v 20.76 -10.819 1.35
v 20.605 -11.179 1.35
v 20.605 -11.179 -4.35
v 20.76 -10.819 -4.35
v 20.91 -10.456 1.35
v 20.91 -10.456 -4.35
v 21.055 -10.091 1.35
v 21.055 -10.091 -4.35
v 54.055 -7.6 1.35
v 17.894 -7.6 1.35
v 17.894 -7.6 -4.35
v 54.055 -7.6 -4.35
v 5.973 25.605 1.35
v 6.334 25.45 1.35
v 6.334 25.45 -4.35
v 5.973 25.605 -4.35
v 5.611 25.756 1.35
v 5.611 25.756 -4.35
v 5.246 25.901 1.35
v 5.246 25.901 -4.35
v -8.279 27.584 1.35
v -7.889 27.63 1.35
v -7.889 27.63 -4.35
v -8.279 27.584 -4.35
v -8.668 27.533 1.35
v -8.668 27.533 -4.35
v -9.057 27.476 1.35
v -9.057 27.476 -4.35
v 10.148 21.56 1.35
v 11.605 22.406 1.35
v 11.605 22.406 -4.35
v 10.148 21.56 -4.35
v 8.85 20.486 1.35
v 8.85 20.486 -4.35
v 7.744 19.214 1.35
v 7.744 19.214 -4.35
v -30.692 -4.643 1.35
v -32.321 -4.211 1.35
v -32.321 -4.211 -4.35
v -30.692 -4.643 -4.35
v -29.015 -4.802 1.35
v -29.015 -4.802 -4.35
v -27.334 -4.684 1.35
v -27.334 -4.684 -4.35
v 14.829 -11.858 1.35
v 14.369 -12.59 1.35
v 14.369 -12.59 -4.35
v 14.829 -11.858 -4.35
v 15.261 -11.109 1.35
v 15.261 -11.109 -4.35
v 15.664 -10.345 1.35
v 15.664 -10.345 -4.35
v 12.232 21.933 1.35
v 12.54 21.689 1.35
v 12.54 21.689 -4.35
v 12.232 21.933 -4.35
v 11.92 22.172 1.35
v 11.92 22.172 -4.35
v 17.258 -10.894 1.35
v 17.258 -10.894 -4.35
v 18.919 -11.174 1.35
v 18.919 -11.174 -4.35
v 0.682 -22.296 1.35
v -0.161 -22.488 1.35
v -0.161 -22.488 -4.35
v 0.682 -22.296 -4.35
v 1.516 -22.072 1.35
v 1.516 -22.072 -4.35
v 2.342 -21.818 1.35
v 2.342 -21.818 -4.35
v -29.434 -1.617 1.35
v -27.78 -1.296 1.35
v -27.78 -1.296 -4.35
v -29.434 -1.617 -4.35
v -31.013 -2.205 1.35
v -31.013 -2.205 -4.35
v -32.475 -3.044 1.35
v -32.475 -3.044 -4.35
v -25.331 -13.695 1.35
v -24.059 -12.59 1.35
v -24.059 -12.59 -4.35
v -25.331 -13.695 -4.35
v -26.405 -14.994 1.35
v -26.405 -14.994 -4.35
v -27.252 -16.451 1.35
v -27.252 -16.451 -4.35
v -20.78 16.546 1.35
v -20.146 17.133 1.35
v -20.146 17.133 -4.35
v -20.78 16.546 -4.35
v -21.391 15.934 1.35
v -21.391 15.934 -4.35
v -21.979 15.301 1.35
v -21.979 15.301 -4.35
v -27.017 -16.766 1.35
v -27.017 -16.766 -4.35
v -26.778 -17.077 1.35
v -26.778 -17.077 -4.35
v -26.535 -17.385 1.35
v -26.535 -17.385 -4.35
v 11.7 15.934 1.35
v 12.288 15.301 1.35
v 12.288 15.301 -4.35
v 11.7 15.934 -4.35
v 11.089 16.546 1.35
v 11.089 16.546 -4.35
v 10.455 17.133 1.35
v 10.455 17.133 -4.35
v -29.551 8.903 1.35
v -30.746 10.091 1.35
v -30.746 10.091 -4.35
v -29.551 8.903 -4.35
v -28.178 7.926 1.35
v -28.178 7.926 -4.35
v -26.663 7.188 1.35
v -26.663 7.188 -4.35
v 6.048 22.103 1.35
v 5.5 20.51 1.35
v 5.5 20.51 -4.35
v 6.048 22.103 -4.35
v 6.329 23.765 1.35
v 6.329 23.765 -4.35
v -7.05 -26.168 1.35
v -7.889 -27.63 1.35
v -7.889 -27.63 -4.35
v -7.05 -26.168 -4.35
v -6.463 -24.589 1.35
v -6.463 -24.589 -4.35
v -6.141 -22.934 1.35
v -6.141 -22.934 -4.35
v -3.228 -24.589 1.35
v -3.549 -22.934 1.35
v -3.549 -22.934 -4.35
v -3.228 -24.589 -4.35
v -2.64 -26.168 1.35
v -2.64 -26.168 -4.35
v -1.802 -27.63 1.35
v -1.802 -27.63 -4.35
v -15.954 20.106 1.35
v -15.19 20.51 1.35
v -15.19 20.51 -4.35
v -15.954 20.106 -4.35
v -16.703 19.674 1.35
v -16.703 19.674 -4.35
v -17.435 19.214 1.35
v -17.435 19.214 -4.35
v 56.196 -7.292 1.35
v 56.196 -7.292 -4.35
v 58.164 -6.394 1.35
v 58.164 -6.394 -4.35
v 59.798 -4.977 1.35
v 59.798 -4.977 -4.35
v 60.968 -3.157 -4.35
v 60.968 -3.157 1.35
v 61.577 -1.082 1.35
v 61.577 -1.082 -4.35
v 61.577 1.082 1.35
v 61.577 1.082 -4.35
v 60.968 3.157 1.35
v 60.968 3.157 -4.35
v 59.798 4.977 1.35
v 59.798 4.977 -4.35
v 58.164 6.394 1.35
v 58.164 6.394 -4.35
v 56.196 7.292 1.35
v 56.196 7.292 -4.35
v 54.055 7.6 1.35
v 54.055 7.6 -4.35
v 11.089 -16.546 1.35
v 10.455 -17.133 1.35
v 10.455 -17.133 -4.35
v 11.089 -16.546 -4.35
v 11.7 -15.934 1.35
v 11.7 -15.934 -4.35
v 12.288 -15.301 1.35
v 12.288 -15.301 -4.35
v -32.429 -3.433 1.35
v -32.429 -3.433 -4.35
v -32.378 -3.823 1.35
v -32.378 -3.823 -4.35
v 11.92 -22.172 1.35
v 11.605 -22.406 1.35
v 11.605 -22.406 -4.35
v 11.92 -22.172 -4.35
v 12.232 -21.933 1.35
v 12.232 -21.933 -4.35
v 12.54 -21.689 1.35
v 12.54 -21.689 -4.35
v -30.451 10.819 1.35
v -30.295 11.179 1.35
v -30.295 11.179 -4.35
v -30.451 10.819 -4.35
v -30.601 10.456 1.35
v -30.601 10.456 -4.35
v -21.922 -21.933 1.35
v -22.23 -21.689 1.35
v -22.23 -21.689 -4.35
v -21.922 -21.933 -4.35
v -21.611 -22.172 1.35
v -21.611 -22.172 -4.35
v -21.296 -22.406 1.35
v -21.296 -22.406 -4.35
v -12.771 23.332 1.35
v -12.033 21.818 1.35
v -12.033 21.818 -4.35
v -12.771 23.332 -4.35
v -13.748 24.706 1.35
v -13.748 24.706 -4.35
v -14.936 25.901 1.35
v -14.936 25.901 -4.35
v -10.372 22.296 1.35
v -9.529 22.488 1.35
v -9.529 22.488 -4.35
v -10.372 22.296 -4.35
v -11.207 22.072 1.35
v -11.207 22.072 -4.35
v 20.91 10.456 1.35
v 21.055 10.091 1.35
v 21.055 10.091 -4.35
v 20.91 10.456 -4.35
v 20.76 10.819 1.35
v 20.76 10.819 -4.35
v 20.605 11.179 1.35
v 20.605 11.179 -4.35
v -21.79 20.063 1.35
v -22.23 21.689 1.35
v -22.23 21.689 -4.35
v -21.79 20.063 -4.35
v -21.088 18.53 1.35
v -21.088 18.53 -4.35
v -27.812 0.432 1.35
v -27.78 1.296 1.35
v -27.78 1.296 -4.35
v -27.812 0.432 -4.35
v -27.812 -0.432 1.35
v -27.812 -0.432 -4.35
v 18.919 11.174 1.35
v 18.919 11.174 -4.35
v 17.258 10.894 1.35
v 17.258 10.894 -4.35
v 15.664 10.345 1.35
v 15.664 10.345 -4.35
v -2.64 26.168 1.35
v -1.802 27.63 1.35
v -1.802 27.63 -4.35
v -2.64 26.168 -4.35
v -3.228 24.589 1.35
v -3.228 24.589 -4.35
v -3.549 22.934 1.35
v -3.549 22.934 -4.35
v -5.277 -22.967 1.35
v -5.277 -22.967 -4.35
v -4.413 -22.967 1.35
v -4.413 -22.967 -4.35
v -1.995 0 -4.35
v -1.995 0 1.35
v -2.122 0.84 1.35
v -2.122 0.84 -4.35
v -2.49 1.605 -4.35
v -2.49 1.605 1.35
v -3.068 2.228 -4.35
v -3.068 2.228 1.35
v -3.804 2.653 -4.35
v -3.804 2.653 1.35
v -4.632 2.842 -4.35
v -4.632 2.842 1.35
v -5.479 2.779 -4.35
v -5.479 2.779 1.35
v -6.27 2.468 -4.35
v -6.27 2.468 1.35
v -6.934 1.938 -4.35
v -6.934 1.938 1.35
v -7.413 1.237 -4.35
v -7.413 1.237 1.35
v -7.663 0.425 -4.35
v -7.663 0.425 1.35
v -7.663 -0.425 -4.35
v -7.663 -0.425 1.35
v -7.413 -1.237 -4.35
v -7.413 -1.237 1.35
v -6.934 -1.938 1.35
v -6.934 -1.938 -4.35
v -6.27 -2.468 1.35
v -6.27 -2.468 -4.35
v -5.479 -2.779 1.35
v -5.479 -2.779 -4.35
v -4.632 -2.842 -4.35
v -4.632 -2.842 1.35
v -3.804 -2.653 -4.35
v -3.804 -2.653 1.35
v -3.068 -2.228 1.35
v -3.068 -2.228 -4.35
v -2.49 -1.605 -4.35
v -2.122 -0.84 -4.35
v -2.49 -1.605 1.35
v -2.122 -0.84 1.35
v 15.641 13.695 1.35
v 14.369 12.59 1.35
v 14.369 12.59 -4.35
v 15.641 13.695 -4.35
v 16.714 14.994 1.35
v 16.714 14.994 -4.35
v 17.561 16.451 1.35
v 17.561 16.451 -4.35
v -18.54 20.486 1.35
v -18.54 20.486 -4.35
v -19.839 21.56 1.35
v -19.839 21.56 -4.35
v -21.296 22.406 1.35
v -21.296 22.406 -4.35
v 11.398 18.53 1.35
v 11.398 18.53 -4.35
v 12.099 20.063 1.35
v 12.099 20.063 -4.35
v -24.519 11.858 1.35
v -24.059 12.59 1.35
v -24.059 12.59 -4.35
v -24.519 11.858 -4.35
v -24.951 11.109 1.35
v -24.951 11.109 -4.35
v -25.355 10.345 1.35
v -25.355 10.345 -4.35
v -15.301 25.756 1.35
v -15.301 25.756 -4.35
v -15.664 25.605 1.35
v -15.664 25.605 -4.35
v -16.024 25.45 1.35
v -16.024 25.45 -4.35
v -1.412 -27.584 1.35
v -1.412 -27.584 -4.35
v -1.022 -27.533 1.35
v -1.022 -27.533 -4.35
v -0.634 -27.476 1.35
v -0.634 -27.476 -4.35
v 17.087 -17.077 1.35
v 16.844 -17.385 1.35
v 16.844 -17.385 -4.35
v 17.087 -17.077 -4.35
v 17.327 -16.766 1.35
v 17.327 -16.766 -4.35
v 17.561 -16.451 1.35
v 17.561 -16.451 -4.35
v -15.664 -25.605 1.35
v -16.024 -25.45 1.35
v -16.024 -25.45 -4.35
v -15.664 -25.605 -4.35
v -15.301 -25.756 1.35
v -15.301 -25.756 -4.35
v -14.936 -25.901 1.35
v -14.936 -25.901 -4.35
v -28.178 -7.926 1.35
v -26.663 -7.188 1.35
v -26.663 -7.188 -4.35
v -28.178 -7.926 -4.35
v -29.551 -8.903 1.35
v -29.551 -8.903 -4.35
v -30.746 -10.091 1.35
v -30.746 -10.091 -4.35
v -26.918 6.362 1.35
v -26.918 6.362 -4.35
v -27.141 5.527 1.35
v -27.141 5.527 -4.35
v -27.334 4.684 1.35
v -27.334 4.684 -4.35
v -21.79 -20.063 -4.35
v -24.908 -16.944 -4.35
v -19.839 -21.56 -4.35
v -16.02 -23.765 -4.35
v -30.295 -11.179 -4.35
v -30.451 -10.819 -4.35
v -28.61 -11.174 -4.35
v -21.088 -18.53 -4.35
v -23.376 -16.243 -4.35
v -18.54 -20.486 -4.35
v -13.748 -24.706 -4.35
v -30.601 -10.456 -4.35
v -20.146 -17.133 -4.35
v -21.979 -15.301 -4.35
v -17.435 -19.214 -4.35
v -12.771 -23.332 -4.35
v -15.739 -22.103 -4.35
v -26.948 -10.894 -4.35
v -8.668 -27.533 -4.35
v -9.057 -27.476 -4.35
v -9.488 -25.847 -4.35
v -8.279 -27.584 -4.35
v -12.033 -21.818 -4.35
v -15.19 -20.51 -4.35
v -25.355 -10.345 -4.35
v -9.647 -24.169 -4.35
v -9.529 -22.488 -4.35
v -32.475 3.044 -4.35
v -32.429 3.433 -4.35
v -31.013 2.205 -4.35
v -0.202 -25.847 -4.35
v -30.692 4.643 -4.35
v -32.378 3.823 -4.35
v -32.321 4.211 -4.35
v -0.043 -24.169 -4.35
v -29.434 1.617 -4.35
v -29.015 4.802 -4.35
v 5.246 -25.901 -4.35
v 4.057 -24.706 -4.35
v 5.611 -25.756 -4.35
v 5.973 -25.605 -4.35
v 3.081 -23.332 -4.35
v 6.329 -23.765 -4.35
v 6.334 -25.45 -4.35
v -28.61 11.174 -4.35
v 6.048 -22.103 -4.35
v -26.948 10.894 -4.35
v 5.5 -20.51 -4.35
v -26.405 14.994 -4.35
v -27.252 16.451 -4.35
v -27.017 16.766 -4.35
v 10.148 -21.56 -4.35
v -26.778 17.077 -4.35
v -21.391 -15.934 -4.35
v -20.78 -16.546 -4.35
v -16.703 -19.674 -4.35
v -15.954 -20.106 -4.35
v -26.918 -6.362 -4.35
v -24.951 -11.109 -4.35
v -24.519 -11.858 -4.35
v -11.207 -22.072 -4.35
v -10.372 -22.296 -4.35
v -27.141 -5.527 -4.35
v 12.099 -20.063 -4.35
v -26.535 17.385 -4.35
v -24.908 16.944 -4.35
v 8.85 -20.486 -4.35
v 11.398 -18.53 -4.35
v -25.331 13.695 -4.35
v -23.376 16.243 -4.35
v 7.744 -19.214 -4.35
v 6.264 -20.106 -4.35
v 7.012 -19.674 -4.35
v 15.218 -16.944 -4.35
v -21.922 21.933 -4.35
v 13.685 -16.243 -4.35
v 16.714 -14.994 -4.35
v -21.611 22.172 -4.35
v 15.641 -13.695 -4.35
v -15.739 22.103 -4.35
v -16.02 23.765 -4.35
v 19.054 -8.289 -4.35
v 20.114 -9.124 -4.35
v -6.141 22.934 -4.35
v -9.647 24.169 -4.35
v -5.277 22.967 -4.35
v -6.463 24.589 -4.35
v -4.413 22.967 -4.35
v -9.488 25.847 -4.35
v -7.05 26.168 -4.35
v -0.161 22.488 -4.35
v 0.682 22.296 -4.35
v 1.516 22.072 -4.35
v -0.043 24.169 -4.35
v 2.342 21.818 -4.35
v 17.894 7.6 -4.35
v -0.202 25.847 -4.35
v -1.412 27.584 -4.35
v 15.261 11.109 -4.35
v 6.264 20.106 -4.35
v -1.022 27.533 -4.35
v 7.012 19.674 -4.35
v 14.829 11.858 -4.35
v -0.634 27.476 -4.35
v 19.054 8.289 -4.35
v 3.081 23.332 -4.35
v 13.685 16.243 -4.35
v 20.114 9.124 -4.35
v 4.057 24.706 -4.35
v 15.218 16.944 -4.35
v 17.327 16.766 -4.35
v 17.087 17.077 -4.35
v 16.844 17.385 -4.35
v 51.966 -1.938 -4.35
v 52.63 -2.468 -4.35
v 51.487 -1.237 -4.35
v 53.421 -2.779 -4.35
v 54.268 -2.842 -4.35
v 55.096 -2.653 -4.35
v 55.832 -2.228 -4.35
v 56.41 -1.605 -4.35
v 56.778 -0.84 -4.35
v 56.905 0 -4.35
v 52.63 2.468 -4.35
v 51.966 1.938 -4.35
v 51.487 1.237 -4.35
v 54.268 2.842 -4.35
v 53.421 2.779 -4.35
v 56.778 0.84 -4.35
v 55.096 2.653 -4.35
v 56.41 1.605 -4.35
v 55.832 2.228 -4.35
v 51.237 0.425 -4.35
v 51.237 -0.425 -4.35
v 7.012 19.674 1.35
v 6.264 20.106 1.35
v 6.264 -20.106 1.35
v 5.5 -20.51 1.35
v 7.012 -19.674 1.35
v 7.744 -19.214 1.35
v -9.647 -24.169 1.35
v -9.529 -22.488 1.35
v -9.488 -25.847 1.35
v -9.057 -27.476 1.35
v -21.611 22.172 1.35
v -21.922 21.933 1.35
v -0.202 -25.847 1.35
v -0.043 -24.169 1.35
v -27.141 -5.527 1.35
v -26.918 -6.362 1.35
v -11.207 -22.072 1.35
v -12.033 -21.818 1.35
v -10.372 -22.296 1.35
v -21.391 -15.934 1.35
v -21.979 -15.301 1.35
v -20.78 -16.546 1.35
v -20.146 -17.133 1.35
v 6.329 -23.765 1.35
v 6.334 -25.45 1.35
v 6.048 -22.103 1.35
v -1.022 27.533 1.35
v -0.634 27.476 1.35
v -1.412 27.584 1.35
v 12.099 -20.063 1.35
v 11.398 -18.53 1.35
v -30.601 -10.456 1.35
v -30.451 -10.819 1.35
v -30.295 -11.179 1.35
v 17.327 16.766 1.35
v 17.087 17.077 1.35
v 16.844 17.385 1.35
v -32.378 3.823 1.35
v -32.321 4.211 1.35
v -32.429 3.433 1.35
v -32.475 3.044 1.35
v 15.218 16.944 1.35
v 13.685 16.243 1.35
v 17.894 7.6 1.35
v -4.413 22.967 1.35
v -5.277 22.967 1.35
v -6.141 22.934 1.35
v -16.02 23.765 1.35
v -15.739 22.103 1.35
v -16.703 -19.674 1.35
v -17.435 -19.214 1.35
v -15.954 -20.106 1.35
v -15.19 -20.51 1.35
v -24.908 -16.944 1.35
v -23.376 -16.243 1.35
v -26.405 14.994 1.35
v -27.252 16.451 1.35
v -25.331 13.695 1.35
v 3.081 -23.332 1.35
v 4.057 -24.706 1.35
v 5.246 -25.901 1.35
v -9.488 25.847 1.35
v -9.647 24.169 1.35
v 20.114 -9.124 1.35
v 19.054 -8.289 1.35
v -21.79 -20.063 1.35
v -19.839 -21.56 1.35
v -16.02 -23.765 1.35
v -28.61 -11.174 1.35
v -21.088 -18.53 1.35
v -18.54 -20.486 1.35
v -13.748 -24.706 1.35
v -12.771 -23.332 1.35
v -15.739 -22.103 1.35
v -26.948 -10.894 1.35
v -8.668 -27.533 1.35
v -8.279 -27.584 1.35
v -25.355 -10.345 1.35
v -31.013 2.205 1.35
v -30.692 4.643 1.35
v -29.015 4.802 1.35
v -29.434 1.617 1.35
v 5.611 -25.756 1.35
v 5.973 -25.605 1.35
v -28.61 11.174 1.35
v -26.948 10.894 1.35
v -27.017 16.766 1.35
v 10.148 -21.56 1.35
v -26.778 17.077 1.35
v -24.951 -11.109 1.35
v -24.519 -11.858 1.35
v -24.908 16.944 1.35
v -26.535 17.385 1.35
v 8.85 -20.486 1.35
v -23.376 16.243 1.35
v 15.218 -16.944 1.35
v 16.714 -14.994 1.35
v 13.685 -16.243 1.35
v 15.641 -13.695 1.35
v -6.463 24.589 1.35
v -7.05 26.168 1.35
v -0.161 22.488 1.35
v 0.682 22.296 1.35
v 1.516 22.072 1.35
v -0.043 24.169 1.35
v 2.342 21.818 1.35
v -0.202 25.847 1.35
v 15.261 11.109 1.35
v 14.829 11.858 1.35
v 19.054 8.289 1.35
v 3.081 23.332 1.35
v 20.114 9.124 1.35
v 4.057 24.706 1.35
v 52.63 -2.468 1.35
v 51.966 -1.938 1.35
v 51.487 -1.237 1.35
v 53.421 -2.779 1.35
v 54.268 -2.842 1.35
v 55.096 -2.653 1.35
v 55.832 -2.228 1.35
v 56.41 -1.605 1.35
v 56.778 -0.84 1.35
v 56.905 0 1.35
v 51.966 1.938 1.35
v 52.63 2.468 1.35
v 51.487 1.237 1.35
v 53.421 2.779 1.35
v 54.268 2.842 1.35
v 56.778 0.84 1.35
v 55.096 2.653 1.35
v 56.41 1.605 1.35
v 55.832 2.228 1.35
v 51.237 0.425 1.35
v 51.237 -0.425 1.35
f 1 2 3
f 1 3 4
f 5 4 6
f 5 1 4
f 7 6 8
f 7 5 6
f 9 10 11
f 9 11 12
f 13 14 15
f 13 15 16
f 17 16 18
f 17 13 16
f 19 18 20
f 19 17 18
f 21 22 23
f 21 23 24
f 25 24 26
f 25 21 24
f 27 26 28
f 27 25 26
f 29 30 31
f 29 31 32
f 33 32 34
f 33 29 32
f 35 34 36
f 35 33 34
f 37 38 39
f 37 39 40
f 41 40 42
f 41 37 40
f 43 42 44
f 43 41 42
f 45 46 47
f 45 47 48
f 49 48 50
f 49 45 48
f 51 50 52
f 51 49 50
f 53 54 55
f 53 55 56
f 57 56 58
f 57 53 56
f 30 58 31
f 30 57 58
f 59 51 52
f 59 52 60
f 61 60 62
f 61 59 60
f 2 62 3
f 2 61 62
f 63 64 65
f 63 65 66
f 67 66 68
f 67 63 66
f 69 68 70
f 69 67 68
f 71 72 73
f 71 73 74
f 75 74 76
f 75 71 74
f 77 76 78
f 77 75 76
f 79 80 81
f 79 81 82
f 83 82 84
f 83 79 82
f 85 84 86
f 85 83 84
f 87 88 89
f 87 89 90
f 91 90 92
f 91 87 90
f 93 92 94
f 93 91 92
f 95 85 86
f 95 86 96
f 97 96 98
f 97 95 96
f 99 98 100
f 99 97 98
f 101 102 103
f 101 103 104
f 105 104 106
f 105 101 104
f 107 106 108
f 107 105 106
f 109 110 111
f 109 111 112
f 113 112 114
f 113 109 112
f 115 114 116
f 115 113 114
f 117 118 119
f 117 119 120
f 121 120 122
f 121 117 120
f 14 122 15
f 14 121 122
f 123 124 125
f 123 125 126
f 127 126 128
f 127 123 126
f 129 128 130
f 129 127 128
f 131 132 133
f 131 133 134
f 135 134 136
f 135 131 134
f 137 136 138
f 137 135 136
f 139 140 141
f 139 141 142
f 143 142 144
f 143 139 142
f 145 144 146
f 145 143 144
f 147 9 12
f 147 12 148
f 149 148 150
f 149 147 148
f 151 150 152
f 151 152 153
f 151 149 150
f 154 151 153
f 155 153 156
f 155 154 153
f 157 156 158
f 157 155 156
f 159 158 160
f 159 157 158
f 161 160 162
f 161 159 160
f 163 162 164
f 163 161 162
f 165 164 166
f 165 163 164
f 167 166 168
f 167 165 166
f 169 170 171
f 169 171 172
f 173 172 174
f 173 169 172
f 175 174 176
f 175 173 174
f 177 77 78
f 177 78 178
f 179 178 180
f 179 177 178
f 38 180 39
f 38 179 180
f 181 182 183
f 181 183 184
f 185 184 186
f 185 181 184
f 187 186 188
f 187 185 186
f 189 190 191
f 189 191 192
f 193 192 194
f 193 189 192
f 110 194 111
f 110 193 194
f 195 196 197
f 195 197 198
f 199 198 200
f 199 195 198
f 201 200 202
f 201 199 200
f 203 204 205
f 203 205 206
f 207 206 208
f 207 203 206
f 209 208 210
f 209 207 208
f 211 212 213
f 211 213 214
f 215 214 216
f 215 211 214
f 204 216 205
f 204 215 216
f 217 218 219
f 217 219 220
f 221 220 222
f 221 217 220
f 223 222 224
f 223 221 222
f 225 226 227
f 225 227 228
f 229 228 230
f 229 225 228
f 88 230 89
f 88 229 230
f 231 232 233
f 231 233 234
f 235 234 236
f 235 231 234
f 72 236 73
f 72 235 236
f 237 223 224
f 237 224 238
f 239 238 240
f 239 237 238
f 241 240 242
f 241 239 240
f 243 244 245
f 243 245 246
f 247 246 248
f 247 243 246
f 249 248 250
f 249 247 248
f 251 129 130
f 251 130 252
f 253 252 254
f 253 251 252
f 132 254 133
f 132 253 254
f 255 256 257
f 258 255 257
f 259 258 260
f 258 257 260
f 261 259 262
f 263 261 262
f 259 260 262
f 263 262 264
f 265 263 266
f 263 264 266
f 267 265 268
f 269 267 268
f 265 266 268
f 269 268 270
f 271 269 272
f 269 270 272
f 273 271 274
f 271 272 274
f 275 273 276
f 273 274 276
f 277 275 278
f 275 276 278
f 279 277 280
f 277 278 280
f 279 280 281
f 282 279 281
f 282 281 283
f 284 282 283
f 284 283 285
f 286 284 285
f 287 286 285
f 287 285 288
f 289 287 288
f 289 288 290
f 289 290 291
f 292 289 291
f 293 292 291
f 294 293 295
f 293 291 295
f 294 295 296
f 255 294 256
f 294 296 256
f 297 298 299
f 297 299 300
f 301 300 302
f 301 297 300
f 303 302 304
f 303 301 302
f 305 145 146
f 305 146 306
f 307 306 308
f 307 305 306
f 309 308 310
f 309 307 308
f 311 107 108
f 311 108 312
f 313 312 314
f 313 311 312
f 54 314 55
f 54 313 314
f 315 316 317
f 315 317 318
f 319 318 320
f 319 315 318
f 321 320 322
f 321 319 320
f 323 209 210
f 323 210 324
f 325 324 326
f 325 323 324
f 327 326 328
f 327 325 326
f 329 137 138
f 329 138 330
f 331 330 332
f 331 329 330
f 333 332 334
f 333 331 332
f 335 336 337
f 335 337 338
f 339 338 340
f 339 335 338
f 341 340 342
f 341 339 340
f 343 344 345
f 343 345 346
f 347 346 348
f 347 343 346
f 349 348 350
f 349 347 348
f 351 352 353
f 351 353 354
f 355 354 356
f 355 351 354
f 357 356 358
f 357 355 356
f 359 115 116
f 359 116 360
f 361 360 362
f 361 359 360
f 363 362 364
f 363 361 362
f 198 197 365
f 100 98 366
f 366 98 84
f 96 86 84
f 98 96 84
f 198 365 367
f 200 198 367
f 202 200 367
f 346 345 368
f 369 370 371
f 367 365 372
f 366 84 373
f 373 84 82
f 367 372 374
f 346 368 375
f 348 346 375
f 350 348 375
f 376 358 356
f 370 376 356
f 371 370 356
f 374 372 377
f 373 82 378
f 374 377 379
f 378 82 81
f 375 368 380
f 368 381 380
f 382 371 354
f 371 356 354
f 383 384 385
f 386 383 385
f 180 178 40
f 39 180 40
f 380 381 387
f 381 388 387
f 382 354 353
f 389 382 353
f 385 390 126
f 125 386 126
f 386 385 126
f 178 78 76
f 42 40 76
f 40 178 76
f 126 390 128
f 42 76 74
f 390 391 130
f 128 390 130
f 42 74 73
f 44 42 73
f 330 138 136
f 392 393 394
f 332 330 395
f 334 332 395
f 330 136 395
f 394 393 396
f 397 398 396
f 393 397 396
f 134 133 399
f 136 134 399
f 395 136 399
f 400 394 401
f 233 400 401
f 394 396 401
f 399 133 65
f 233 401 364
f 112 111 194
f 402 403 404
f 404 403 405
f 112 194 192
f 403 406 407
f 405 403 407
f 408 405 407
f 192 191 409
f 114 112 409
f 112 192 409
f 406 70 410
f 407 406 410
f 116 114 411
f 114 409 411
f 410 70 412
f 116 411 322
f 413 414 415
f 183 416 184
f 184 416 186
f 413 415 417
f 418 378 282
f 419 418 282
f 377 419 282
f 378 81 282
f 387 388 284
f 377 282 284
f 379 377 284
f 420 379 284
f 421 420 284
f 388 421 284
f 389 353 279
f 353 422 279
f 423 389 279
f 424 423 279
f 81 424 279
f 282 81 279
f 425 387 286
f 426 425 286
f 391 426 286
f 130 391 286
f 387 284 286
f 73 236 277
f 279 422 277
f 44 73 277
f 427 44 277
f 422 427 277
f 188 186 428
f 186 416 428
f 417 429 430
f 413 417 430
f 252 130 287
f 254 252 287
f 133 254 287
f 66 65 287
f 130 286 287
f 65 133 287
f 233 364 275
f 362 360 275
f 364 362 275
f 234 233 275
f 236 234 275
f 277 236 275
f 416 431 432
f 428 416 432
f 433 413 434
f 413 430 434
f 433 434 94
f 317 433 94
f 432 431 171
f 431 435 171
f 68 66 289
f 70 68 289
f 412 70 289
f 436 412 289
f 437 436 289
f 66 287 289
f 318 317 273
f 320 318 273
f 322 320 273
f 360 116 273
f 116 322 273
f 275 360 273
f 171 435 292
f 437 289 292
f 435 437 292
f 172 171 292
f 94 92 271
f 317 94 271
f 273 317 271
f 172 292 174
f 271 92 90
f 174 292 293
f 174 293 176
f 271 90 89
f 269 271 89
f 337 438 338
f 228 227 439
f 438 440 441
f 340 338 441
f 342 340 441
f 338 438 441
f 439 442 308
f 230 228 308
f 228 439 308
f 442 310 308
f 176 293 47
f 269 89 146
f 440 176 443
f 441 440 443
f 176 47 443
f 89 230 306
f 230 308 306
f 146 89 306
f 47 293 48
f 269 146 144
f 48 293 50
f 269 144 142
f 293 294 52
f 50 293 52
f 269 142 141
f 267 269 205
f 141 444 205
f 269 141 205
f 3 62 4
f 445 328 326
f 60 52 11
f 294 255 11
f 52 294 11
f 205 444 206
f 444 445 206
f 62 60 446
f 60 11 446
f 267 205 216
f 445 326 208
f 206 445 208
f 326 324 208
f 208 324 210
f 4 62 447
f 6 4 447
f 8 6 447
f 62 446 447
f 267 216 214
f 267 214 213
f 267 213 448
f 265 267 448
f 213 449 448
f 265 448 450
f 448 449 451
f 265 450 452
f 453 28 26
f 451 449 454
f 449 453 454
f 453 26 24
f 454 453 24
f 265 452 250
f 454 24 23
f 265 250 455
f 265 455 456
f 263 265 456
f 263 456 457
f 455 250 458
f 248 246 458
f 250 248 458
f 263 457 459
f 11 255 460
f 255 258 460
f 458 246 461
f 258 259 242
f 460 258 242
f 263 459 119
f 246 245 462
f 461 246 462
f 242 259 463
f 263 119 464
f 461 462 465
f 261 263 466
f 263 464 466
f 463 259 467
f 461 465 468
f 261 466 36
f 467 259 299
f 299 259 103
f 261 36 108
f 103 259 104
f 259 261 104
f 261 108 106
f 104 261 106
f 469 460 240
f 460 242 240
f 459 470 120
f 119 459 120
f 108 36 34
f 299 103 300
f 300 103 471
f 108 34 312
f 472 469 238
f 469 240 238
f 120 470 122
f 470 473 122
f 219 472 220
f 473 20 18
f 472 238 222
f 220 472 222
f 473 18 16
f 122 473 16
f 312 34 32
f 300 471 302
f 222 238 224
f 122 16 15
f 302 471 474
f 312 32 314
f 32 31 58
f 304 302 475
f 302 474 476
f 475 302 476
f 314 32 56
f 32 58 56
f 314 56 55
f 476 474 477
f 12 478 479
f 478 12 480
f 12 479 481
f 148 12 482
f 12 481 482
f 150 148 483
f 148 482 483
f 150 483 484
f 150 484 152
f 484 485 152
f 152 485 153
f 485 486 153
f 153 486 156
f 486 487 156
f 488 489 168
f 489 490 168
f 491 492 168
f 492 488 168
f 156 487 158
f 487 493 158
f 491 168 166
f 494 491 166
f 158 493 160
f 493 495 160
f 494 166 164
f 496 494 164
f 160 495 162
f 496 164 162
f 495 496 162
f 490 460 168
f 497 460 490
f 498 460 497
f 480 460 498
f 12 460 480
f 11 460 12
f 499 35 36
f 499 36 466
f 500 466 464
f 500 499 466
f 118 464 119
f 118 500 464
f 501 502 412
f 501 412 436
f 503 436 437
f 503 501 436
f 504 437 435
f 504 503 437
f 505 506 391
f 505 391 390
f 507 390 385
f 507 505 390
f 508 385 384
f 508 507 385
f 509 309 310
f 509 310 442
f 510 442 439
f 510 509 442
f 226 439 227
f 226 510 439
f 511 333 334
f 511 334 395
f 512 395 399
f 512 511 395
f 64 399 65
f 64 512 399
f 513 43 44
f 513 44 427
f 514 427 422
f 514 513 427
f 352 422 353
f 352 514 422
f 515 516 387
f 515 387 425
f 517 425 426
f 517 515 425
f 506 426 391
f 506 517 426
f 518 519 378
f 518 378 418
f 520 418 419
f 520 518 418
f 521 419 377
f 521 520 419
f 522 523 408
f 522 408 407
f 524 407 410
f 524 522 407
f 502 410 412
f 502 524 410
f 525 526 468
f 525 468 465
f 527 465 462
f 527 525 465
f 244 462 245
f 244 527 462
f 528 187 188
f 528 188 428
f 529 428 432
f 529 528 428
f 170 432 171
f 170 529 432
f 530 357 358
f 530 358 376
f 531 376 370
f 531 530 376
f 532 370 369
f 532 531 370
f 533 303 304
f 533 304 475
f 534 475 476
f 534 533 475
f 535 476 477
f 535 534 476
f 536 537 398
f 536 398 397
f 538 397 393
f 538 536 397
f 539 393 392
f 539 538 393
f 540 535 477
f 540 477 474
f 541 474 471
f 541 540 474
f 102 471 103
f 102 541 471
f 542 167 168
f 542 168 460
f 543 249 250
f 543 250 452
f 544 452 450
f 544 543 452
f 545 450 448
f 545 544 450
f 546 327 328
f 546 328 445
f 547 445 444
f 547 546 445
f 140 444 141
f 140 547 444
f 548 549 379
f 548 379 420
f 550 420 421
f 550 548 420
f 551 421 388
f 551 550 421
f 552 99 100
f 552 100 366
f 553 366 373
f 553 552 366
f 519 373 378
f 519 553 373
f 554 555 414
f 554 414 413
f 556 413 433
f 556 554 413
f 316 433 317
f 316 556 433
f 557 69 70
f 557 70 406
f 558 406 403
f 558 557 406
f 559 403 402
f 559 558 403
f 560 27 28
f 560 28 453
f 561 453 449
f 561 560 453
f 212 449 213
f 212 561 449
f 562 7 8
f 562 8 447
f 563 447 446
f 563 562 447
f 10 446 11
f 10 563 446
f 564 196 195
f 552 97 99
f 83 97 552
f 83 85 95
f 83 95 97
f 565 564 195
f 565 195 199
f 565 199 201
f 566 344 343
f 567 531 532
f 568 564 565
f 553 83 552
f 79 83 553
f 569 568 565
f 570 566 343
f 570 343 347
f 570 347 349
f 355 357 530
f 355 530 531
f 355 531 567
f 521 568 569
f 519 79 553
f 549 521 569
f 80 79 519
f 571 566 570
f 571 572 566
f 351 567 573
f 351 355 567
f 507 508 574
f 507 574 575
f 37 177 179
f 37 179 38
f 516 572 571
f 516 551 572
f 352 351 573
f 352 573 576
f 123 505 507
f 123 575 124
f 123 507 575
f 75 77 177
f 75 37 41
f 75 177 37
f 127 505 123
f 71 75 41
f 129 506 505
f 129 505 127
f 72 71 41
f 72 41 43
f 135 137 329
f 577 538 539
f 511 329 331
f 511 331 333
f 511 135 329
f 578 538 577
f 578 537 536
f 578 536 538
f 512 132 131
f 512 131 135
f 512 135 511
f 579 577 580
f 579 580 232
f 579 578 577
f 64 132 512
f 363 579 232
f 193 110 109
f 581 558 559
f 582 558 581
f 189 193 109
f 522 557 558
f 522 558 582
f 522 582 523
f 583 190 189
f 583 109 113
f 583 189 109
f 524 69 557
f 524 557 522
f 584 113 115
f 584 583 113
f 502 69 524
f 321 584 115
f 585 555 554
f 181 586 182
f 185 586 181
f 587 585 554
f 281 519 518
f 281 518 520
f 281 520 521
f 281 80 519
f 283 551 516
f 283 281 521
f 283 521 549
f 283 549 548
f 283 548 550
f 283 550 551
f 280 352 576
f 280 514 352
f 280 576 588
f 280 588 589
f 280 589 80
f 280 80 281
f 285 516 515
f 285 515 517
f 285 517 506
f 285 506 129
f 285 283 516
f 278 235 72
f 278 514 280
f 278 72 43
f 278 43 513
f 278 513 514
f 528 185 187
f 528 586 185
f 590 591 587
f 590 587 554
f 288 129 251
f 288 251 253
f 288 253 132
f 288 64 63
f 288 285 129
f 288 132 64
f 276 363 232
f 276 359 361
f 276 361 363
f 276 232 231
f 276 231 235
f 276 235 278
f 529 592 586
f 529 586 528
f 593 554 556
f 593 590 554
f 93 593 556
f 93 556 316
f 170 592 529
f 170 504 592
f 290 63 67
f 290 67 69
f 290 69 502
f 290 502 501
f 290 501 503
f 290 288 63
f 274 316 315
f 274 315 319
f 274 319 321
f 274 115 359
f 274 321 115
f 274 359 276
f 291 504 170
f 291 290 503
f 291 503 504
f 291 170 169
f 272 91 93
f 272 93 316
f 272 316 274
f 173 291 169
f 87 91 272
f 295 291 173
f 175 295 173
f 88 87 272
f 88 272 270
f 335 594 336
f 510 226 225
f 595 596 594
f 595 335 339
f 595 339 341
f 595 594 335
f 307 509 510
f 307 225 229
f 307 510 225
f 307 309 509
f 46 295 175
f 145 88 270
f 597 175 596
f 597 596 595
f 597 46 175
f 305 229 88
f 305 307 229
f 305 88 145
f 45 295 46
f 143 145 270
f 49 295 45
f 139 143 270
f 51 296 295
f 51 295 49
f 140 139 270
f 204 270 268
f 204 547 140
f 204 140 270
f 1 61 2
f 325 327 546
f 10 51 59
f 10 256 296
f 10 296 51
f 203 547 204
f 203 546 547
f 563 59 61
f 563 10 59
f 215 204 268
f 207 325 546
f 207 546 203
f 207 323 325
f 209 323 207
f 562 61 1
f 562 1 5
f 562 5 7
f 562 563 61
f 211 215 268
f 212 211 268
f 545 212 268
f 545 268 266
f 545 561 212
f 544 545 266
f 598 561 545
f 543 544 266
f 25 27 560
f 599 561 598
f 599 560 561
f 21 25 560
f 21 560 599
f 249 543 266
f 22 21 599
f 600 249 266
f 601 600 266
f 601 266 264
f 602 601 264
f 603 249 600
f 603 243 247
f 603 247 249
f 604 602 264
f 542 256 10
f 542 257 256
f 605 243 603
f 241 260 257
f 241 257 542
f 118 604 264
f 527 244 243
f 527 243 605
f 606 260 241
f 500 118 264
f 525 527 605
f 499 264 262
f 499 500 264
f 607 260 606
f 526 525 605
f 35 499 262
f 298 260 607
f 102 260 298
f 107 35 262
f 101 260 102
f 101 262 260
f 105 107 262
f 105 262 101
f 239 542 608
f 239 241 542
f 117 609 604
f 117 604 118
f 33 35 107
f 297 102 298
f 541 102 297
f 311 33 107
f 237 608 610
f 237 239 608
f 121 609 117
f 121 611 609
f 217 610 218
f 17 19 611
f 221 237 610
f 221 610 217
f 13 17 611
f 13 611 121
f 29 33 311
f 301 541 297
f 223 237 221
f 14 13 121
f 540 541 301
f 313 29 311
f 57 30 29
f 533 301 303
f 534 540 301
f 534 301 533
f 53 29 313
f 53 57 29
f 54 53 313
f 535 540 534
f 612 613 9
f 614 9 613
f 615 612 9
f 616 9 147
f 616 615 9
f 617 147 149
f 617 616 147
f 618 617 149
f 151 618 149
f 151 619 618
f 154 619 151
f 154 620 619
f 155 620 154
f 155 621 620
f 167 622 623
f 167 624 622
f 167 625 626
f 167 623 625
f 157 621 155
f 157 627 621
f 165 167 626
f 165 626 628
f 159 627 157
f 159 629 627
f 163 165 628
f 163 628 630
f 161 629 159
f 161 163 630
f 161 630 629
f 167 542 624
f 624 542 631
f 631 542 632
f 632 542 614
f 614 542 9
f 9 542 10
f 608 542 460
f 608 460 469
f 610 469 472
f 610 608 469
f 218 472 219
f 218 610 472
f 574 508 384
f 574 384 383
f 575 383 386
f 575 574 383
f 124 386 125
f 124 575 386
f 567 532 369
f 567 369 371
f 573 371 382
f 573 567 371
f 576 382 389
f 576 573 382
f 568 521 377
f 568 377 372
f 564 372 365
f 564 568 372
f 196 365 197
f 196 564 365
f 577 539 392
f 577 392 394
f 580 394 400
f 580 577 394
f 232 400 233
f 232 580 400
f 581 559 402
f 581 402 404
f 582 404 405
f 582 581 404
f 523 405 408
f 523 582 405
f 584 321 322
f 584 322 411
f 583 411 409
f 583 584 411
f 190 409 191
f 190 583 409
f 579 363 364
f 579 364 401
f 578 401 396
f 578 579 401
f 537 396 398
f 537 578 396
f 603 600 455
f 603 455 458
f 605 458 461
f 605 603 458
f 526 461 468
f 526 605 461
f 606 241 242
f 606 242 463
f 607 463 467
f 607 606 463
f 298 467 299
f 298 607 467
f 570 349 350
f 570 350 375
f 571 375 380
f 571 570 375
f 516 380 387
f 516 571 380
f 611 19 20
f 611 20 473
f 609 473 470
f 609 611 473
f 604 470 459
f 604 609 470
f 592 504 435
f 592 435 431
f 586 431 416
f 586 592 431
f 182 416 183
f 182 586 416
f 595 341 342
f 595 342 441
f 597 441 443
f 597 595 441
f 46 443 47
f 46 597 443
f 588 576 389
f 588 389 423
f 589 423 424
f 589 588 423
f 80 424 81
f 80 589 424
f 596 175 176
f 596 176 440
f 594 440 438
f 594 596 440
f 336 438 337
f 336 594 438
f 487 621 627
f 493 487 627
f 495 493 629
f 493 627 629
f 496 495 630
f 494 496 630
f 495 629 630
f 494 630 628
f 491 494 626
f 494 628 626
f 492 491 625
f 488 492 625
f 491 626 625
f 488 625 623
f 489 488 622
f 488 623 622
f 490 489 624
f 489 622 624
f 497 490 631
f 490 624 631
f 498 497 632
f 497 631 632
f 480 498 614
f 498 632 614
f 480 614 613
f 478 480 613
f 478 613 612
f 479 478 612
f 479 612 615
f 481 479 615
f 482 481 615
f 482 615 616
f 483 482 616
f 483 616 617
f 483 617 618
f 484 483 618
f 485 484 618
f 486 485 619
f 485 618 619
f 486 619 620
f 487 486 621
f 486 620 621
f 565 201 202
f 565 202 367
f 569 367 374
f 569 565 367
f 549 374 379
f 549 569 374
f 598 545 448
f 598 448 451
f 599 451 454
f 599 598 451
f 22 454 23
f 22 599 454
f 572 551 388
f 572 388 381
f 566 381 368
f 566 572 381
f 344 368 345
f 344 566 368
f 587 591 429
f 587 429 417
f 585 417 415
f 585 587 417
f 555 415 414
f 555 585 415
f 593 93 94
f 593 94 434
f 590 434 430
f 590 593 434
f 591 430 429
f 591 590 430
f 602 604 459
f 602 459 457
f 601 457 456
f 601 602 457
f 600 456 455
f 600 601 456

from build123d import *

# Parameters (mm, degrees)
SKETCH1_R           = 1.5
BOSS_EXTRUDE1_DEPTH = 3
SCALE1_SCALE        = 1.9


with BuildPart() as part:
    # Sketch1 → Boss-Extrude1 (new body)
    with BuildSketch(Plane.XY):
        with BuildLine():
            ThreePointArc((31, -4), (35, 0), (31, 4))
            Line((31, 4), (11.967993881, 4))
            ThreePointArc((11.967993881, 4), (12.864888434, 4.573115684), (13.63194632, 5.311020574))
            ThreePointArc((13.63194632, 5.311020574), (13.516357561, 5.598658616), (13.394700346, 5.883783021))
            ThreePointArc((13.394700346, 5.883783021), (12.067442445, 5.825370588), (10.794615193, 5.444665539))
            ThreePointArc((10.794615193, 5.444665539), (10.470247132, 6.045), (10.112526268, 6.626078212))
            ThreePointArc((10.112526268, 6.626078212), (11.078640138, 7.538026423), (11.79285574, 8.658259265))
            ThreePointArc((11.79285574, 8.658259265), (11.606759368, 8.906179706), (11.415451897, 9.150101529))
            ThreePointArc((11.415451897, 9.150101529), (10.148537462, 8.750159829), (9.017614465, 8.052995056))
            ThreePointArc((9.017614465, 8.052995056), (8.548920985, 8.548920985), (8.052995056, 9.017614465))
            ThreePointArc((8.052995056, 9.017614465), (8.750159829, 10.148537462), (9.150101529, 11.415451897))
            ThreePointArc((9.150101529, 11.415451897), (8.906179706, 11.606759368), (8.658259265, 11.79285574))
            ThreePointArc((8.658259265, 11.79285574), (7.538026423, 11.078640138), (6.626078212, 10.112526268))
            ThreePointArc((6.626078212, 10.112526268), (6.045, 10.470247132), (5.444665539, 10.794615193))
            ThreePointArc((5.444665539, 10.794615193), (5.825370588, 12.067442445), (5.883783021, 13.394700346))
            ThreePointArc((5.883783021, 13.394700346), (5.598658616, 13.516357561), (5.311020574, 13.63194632))
            ThreePointArc((5.311020574, 13.63194632), (4.413811339, 12.65212943), (3.78298568, 11.482905527))
            ThreePointArc((3.78298568, 11.482905527), (3.129122255, 11.67804324), (2.465291063, 11.835980736))
            ThreePointArc((2.465291063, 11.835980736), (2.503591968, 13.163971168), (2.216494423, 14.461122103))
            ThreePointArc((2.216494423, 14.461122103), (1.909598192, 14.504838322), (1.601844607, 14.542042286))
            ThreePointArc((1.601844607, 14.542042286), (0.988802307, 13.36339701), (0.682088925, 12.070743751))
            ThreePointArc((0.682088925, 12.070743751), (0, 12.09), (-0.682088925, 12.070743751))
            ThreePointArc((-0.682088925, 12.070743751), (-0.988802307, 13.36339701), (-1.601844607, 14.542042286))
            ThreePointArc((-1.601844607, 14.542042286), (-1.909598192, 14.504838322), (-2.216494423, 14.461122103))
            ThreePointArc((-2.216494423, 14.461122103), (-2.503591968, 13.163971168), (-2.465291063, 11.835980736))
            ThreePointArc((-2.465291063, 11.835980736), (-3.129122255, 11.67804324), (-3.78298568, 11.482905527))
            ThreePointArc((-3.78298568, 11.482905527), (-4.413811339, 12.65212943), (-5.311020574, 13.63194632))
            ThreePointArc((-5.311020574, 13.63194632), (-5.598658616, 13.516357561), (-5.883783021, 13.394700346))
            ThreePointArc((-5.883783021, 13.394700346), (-5.825370588, 12.067442445), (-5.444665539, 10.794615193))
            ThreePointArc((-5.444665539, 10.794615193), (-6.045, 10.470247132), (-6.626078212, 10.112526268))
            ThreePointArc((-6.626078212, 10.112526268), (-7.538026423, 11.078640138), (-8.658259265, 11.79285574))
            ThreePointArc((-8.658259265, 11.79285574), (-8.906179706, 11.606759368), (-9.150101529, 11.415451897))
            ThreePointArc((-9.150101529, 11.415451897), (-8.750159829, 10.148537462), (-8.052995056, 9.017614465))
            ThreePointArc((-8.052995056, 9.017614465), (-8.548920985, 8.548920985), (-9.017614465, 8.052995056))
            ThreePointArc((-9.017614465, 8.052995056), (-10.148537462, 8.750159829), (-11.415451897, 9.150101529))
            ThreePointArc((-11.415451897, 9.150101529), (-11.606759368, 8.906179706), (-11.79285574, 8.658259265))
            ThreePointArc((-11.79285574, 8.658259265), (-11.078640138, 7.538026423), (-10.112526268, 6.626078212))
            ThreePointArc((-10.112526268, 6.626078212), (-10.470247132, 6.045), (-10.794615193, 5.444665539))
            ThreePointArc((-10.794615193, 5.444665539), (-12.067442445, 5.825370588), (-13.394700346, 5.883783021))
            ThreePointArc((-13.394700346, 5.883783021), (-13.516357561, 5.598658616), (-13.63194632, 5.311020574))
            ThreePointArc((-13.63194632, 5.311020574), (-12.65212943, 4.413811339), (-11.482905527, 3.78298568))
            ThreePointArc((-11.482905527, 3.78298568), (-11.67804324, 3.129122255), (-11.835980736, 2.465291063))
            ThreePointArc((-11.835980736, 2.465291063), (-13.163971168, 2.503591968), (-14.461122103, 2.216494423))
            ThreePointArc((-14.461122103, 2.216494423), (-14.504838322, 1.909598192), (-14.542042286, 1.601844607))
            ThreePointArc((-14.542042286, 1.601844607), (-13.36339701, 0.988802307), (-12.070743751, 0.682088925))
            ThreePointArc((-12.070743751, 0.682088925), (-12.09, 0), (-12.070743751, -0.682088925))
            ThreePointArc((-12.070743751, -0.682088925), (-13.36339701, -0.988802307), (-14.542042286, -1.601844607))
            ThreePointArc((-14.542042286, -1.601844607), (-14.504838322, -1.909598192), (-14.461122103, -2.216494423))
            ThreePointArc((-14.461122103, -2.216494423), (-13.163971168, -2.503591968), (-11.835980736, -2.465291063))
            ThreePointArc((-11.835980736, -2.465291063), (-11.67804324, -3.129122255), (-11.482905527, -3.78298568))
            ThreePointArc((-11.482905527, -3.78298568), (-12.65212943, -4.413811339), (-13.63194632, -5.311020574))
            ThreePointArc((-13.63194632, -5.311020574), (-13.516357561, -5.598658616), (-13.394700346, -5.883783021))
            ThreePointArc((-13.394700346, -5.883783021), (-12.067442445, -5.825370588), (-10.794615193, -5.444665539))
            ThreePointArc((-10.794615193, -5.444665539), (-10.470247132, -6.045), (-10.112526268, -6.626078212))
            ThreePointArc((-10.112526268, -6.626078212), (-11.078640138, -7.538026423), (-11.79285574, -8.658259265))
            ThreePointArc((-11.79285574, -8.658259265), (-11.606759368, -8.906179706), (-11.415451897, -9.150101529))
            ThreePointArc((-11.415451897, -9.150101529), (-10.148537462, -8.750159829), (-9.017614465, -8.052995056))
            ThreePointArc((-9.017614465, -8.052995056), (-8.548920985, -8.548920985), (-8.052995056, -9.017614465))
            ThreePointArc((-8.052995056, -9.017614465), (-8.750159829, -10.148537462), (-9.150101529, -11.415451897))
            ThreePointArc((-9.150101529, -11.415451897), (-8.906179706, -11.606759368), (-8.658259265, -11.79285574))
            ThreePointArc((-8.658259265, -11.79285574), (-7.538026423, -11.078640138), (-6.626078212, -10.112526268))
            ThreePointArc((-6.626078212, -10.112526268), (-6.045, -10.470247132), (-5.444665539, -10.794615193))
            ThreePointArc((-5.444665539, -10.794615193), (-5.825370588, -12.067442445), (-5.883783021, -13.394700346))
            ThreePointArc((-5.883783021, -13.394700346), (-5.598658616, -13.516357561), (-5.311020574, -13.63194632))
            ThreePointArc((-5.311020574, -13.63194632), (-4.413811339, -12.65212943), (-3.78298568, -11.482905527))
            ThreePointArc((-3.78298568, -11.482905527), (-3.129122255, -11.67804324), (-2.465291063, -11.835980736))
            ThreePointArc((-2.465291063, -11.835980736), (-2.503591968, -13.163971168), (-2.216494423, -14.461122103))
            ThreePointArc((-2.216494423, -14.461122103), (-1.909598192, -14.504838322), (-1.601844607, -14.542042286))
            ThreePointArc((-1.601844607, -14.542042286), (-0.988802307, -13.36339701), (-0.682088925, -12.070743751))
            ThreePointArc((-0.682088925, -12.070743751), (0, -12.09), (0.682088925, -12.070743751))
            ThreePointArc((0.682088925, -12.070743751), (0.988802307, -13.36339701), (1.601844607, -14.542042286))
            ThreePointArc((1.601844607, -14.542042286), (1.909598192, -14.504838322), (2.216494423, -14.461122103))
            ThreePointArc((2.216494423, -14.461122103), (2.503591968, -13.163971168), (2.465291063, -11.835980736))
            ThreePointArc((2.465291063, -11.835980736), (3.129122255, -11.67804324), (3.78298568, -11.482905527))
            ThreePointArc((3.78298568, -11.482905527), (4.413811339, -12.65212943), (5.311020574, -13.63194632))
            ThreePointArc((5.311020574, -13.63194632), (5.598658616, -13.516357561), (5.883783021, -13.394700346))
            ThreePointArc((5.883783021, -13.394700346), (5.825370588, -12.067442445), (5.444665539, -10.794615193))
            ThreePointArc((5.444665539, -10.794615193), (6.045, -10.470247132), (6.626078212, -10.112526268))
            ThreePointArc((6.626078212, -10.112526268), (7.538026423, -11.078640138), (8.658259265, -11.79285574))
            ThreePointArc((8.658259265, -11.79285574), (8.906179706, -11.606759368), (9.150101529, -11.415451897))
            ThreePointArc((9.150101529, -11.415451897), (8.750159829, -10.148537462), (8.052995056, -9.017614465))
            ThreePointArc((8.052995056, -9.017614465), (8.548920985, -8.548920985), (9.017614465, -8.052995056))
            ThreePointArc((9.017614465, -8.052995056), (10.148537462, -8.750159829), (11.415451897, -9.150101529))
            ThreePointArc((11.415451897, -9.150101529), (11.606759368, -8.906179706), (11.79285574, -8.658259265))
            ThreePointArc((11.79285574, -8.658259265), (11.078640138, -7.538026423), (10.112526268, -6.626078212))
            ThreePointArc((10.112526268, -6.626078212), (10.470247132, -6.045), (10.794615193, -5.444665539))
            ThreePointArc((10.794615193, -5.444665539), (12.067442445, -5.825370588), (13.394700346, -5.883783021))
            ThreePointArc((13.394700346, -5.883783021), (13.516357561, -5.598658616), (13.63194632, -5.311020574))
            ThreePointArc((13.63194632, -5.311020574), (12.864888434, -4.573115684), (11.967993881, -4))
            Line((11.967993881, -4), (31, -4))
        make_face()
        Circle(SKETCH1_R, mode=Mode.SUBTRACT)
        with Locations((31, 0)):
            Circle(SKETCH1_R, mode=Mode.SUBTRACT)
    extrude(amount=-BOSS_EXTRUDE1_DEPTH)


with BuildPart() as part_1:
    # Scale1: scaled about (5.383637445, 0, -1.5)
    add(part.part.scale(SCALE1_SCALE).moved(Location((-4.8452737, 0, 1.35))))


solid = part_1.part
